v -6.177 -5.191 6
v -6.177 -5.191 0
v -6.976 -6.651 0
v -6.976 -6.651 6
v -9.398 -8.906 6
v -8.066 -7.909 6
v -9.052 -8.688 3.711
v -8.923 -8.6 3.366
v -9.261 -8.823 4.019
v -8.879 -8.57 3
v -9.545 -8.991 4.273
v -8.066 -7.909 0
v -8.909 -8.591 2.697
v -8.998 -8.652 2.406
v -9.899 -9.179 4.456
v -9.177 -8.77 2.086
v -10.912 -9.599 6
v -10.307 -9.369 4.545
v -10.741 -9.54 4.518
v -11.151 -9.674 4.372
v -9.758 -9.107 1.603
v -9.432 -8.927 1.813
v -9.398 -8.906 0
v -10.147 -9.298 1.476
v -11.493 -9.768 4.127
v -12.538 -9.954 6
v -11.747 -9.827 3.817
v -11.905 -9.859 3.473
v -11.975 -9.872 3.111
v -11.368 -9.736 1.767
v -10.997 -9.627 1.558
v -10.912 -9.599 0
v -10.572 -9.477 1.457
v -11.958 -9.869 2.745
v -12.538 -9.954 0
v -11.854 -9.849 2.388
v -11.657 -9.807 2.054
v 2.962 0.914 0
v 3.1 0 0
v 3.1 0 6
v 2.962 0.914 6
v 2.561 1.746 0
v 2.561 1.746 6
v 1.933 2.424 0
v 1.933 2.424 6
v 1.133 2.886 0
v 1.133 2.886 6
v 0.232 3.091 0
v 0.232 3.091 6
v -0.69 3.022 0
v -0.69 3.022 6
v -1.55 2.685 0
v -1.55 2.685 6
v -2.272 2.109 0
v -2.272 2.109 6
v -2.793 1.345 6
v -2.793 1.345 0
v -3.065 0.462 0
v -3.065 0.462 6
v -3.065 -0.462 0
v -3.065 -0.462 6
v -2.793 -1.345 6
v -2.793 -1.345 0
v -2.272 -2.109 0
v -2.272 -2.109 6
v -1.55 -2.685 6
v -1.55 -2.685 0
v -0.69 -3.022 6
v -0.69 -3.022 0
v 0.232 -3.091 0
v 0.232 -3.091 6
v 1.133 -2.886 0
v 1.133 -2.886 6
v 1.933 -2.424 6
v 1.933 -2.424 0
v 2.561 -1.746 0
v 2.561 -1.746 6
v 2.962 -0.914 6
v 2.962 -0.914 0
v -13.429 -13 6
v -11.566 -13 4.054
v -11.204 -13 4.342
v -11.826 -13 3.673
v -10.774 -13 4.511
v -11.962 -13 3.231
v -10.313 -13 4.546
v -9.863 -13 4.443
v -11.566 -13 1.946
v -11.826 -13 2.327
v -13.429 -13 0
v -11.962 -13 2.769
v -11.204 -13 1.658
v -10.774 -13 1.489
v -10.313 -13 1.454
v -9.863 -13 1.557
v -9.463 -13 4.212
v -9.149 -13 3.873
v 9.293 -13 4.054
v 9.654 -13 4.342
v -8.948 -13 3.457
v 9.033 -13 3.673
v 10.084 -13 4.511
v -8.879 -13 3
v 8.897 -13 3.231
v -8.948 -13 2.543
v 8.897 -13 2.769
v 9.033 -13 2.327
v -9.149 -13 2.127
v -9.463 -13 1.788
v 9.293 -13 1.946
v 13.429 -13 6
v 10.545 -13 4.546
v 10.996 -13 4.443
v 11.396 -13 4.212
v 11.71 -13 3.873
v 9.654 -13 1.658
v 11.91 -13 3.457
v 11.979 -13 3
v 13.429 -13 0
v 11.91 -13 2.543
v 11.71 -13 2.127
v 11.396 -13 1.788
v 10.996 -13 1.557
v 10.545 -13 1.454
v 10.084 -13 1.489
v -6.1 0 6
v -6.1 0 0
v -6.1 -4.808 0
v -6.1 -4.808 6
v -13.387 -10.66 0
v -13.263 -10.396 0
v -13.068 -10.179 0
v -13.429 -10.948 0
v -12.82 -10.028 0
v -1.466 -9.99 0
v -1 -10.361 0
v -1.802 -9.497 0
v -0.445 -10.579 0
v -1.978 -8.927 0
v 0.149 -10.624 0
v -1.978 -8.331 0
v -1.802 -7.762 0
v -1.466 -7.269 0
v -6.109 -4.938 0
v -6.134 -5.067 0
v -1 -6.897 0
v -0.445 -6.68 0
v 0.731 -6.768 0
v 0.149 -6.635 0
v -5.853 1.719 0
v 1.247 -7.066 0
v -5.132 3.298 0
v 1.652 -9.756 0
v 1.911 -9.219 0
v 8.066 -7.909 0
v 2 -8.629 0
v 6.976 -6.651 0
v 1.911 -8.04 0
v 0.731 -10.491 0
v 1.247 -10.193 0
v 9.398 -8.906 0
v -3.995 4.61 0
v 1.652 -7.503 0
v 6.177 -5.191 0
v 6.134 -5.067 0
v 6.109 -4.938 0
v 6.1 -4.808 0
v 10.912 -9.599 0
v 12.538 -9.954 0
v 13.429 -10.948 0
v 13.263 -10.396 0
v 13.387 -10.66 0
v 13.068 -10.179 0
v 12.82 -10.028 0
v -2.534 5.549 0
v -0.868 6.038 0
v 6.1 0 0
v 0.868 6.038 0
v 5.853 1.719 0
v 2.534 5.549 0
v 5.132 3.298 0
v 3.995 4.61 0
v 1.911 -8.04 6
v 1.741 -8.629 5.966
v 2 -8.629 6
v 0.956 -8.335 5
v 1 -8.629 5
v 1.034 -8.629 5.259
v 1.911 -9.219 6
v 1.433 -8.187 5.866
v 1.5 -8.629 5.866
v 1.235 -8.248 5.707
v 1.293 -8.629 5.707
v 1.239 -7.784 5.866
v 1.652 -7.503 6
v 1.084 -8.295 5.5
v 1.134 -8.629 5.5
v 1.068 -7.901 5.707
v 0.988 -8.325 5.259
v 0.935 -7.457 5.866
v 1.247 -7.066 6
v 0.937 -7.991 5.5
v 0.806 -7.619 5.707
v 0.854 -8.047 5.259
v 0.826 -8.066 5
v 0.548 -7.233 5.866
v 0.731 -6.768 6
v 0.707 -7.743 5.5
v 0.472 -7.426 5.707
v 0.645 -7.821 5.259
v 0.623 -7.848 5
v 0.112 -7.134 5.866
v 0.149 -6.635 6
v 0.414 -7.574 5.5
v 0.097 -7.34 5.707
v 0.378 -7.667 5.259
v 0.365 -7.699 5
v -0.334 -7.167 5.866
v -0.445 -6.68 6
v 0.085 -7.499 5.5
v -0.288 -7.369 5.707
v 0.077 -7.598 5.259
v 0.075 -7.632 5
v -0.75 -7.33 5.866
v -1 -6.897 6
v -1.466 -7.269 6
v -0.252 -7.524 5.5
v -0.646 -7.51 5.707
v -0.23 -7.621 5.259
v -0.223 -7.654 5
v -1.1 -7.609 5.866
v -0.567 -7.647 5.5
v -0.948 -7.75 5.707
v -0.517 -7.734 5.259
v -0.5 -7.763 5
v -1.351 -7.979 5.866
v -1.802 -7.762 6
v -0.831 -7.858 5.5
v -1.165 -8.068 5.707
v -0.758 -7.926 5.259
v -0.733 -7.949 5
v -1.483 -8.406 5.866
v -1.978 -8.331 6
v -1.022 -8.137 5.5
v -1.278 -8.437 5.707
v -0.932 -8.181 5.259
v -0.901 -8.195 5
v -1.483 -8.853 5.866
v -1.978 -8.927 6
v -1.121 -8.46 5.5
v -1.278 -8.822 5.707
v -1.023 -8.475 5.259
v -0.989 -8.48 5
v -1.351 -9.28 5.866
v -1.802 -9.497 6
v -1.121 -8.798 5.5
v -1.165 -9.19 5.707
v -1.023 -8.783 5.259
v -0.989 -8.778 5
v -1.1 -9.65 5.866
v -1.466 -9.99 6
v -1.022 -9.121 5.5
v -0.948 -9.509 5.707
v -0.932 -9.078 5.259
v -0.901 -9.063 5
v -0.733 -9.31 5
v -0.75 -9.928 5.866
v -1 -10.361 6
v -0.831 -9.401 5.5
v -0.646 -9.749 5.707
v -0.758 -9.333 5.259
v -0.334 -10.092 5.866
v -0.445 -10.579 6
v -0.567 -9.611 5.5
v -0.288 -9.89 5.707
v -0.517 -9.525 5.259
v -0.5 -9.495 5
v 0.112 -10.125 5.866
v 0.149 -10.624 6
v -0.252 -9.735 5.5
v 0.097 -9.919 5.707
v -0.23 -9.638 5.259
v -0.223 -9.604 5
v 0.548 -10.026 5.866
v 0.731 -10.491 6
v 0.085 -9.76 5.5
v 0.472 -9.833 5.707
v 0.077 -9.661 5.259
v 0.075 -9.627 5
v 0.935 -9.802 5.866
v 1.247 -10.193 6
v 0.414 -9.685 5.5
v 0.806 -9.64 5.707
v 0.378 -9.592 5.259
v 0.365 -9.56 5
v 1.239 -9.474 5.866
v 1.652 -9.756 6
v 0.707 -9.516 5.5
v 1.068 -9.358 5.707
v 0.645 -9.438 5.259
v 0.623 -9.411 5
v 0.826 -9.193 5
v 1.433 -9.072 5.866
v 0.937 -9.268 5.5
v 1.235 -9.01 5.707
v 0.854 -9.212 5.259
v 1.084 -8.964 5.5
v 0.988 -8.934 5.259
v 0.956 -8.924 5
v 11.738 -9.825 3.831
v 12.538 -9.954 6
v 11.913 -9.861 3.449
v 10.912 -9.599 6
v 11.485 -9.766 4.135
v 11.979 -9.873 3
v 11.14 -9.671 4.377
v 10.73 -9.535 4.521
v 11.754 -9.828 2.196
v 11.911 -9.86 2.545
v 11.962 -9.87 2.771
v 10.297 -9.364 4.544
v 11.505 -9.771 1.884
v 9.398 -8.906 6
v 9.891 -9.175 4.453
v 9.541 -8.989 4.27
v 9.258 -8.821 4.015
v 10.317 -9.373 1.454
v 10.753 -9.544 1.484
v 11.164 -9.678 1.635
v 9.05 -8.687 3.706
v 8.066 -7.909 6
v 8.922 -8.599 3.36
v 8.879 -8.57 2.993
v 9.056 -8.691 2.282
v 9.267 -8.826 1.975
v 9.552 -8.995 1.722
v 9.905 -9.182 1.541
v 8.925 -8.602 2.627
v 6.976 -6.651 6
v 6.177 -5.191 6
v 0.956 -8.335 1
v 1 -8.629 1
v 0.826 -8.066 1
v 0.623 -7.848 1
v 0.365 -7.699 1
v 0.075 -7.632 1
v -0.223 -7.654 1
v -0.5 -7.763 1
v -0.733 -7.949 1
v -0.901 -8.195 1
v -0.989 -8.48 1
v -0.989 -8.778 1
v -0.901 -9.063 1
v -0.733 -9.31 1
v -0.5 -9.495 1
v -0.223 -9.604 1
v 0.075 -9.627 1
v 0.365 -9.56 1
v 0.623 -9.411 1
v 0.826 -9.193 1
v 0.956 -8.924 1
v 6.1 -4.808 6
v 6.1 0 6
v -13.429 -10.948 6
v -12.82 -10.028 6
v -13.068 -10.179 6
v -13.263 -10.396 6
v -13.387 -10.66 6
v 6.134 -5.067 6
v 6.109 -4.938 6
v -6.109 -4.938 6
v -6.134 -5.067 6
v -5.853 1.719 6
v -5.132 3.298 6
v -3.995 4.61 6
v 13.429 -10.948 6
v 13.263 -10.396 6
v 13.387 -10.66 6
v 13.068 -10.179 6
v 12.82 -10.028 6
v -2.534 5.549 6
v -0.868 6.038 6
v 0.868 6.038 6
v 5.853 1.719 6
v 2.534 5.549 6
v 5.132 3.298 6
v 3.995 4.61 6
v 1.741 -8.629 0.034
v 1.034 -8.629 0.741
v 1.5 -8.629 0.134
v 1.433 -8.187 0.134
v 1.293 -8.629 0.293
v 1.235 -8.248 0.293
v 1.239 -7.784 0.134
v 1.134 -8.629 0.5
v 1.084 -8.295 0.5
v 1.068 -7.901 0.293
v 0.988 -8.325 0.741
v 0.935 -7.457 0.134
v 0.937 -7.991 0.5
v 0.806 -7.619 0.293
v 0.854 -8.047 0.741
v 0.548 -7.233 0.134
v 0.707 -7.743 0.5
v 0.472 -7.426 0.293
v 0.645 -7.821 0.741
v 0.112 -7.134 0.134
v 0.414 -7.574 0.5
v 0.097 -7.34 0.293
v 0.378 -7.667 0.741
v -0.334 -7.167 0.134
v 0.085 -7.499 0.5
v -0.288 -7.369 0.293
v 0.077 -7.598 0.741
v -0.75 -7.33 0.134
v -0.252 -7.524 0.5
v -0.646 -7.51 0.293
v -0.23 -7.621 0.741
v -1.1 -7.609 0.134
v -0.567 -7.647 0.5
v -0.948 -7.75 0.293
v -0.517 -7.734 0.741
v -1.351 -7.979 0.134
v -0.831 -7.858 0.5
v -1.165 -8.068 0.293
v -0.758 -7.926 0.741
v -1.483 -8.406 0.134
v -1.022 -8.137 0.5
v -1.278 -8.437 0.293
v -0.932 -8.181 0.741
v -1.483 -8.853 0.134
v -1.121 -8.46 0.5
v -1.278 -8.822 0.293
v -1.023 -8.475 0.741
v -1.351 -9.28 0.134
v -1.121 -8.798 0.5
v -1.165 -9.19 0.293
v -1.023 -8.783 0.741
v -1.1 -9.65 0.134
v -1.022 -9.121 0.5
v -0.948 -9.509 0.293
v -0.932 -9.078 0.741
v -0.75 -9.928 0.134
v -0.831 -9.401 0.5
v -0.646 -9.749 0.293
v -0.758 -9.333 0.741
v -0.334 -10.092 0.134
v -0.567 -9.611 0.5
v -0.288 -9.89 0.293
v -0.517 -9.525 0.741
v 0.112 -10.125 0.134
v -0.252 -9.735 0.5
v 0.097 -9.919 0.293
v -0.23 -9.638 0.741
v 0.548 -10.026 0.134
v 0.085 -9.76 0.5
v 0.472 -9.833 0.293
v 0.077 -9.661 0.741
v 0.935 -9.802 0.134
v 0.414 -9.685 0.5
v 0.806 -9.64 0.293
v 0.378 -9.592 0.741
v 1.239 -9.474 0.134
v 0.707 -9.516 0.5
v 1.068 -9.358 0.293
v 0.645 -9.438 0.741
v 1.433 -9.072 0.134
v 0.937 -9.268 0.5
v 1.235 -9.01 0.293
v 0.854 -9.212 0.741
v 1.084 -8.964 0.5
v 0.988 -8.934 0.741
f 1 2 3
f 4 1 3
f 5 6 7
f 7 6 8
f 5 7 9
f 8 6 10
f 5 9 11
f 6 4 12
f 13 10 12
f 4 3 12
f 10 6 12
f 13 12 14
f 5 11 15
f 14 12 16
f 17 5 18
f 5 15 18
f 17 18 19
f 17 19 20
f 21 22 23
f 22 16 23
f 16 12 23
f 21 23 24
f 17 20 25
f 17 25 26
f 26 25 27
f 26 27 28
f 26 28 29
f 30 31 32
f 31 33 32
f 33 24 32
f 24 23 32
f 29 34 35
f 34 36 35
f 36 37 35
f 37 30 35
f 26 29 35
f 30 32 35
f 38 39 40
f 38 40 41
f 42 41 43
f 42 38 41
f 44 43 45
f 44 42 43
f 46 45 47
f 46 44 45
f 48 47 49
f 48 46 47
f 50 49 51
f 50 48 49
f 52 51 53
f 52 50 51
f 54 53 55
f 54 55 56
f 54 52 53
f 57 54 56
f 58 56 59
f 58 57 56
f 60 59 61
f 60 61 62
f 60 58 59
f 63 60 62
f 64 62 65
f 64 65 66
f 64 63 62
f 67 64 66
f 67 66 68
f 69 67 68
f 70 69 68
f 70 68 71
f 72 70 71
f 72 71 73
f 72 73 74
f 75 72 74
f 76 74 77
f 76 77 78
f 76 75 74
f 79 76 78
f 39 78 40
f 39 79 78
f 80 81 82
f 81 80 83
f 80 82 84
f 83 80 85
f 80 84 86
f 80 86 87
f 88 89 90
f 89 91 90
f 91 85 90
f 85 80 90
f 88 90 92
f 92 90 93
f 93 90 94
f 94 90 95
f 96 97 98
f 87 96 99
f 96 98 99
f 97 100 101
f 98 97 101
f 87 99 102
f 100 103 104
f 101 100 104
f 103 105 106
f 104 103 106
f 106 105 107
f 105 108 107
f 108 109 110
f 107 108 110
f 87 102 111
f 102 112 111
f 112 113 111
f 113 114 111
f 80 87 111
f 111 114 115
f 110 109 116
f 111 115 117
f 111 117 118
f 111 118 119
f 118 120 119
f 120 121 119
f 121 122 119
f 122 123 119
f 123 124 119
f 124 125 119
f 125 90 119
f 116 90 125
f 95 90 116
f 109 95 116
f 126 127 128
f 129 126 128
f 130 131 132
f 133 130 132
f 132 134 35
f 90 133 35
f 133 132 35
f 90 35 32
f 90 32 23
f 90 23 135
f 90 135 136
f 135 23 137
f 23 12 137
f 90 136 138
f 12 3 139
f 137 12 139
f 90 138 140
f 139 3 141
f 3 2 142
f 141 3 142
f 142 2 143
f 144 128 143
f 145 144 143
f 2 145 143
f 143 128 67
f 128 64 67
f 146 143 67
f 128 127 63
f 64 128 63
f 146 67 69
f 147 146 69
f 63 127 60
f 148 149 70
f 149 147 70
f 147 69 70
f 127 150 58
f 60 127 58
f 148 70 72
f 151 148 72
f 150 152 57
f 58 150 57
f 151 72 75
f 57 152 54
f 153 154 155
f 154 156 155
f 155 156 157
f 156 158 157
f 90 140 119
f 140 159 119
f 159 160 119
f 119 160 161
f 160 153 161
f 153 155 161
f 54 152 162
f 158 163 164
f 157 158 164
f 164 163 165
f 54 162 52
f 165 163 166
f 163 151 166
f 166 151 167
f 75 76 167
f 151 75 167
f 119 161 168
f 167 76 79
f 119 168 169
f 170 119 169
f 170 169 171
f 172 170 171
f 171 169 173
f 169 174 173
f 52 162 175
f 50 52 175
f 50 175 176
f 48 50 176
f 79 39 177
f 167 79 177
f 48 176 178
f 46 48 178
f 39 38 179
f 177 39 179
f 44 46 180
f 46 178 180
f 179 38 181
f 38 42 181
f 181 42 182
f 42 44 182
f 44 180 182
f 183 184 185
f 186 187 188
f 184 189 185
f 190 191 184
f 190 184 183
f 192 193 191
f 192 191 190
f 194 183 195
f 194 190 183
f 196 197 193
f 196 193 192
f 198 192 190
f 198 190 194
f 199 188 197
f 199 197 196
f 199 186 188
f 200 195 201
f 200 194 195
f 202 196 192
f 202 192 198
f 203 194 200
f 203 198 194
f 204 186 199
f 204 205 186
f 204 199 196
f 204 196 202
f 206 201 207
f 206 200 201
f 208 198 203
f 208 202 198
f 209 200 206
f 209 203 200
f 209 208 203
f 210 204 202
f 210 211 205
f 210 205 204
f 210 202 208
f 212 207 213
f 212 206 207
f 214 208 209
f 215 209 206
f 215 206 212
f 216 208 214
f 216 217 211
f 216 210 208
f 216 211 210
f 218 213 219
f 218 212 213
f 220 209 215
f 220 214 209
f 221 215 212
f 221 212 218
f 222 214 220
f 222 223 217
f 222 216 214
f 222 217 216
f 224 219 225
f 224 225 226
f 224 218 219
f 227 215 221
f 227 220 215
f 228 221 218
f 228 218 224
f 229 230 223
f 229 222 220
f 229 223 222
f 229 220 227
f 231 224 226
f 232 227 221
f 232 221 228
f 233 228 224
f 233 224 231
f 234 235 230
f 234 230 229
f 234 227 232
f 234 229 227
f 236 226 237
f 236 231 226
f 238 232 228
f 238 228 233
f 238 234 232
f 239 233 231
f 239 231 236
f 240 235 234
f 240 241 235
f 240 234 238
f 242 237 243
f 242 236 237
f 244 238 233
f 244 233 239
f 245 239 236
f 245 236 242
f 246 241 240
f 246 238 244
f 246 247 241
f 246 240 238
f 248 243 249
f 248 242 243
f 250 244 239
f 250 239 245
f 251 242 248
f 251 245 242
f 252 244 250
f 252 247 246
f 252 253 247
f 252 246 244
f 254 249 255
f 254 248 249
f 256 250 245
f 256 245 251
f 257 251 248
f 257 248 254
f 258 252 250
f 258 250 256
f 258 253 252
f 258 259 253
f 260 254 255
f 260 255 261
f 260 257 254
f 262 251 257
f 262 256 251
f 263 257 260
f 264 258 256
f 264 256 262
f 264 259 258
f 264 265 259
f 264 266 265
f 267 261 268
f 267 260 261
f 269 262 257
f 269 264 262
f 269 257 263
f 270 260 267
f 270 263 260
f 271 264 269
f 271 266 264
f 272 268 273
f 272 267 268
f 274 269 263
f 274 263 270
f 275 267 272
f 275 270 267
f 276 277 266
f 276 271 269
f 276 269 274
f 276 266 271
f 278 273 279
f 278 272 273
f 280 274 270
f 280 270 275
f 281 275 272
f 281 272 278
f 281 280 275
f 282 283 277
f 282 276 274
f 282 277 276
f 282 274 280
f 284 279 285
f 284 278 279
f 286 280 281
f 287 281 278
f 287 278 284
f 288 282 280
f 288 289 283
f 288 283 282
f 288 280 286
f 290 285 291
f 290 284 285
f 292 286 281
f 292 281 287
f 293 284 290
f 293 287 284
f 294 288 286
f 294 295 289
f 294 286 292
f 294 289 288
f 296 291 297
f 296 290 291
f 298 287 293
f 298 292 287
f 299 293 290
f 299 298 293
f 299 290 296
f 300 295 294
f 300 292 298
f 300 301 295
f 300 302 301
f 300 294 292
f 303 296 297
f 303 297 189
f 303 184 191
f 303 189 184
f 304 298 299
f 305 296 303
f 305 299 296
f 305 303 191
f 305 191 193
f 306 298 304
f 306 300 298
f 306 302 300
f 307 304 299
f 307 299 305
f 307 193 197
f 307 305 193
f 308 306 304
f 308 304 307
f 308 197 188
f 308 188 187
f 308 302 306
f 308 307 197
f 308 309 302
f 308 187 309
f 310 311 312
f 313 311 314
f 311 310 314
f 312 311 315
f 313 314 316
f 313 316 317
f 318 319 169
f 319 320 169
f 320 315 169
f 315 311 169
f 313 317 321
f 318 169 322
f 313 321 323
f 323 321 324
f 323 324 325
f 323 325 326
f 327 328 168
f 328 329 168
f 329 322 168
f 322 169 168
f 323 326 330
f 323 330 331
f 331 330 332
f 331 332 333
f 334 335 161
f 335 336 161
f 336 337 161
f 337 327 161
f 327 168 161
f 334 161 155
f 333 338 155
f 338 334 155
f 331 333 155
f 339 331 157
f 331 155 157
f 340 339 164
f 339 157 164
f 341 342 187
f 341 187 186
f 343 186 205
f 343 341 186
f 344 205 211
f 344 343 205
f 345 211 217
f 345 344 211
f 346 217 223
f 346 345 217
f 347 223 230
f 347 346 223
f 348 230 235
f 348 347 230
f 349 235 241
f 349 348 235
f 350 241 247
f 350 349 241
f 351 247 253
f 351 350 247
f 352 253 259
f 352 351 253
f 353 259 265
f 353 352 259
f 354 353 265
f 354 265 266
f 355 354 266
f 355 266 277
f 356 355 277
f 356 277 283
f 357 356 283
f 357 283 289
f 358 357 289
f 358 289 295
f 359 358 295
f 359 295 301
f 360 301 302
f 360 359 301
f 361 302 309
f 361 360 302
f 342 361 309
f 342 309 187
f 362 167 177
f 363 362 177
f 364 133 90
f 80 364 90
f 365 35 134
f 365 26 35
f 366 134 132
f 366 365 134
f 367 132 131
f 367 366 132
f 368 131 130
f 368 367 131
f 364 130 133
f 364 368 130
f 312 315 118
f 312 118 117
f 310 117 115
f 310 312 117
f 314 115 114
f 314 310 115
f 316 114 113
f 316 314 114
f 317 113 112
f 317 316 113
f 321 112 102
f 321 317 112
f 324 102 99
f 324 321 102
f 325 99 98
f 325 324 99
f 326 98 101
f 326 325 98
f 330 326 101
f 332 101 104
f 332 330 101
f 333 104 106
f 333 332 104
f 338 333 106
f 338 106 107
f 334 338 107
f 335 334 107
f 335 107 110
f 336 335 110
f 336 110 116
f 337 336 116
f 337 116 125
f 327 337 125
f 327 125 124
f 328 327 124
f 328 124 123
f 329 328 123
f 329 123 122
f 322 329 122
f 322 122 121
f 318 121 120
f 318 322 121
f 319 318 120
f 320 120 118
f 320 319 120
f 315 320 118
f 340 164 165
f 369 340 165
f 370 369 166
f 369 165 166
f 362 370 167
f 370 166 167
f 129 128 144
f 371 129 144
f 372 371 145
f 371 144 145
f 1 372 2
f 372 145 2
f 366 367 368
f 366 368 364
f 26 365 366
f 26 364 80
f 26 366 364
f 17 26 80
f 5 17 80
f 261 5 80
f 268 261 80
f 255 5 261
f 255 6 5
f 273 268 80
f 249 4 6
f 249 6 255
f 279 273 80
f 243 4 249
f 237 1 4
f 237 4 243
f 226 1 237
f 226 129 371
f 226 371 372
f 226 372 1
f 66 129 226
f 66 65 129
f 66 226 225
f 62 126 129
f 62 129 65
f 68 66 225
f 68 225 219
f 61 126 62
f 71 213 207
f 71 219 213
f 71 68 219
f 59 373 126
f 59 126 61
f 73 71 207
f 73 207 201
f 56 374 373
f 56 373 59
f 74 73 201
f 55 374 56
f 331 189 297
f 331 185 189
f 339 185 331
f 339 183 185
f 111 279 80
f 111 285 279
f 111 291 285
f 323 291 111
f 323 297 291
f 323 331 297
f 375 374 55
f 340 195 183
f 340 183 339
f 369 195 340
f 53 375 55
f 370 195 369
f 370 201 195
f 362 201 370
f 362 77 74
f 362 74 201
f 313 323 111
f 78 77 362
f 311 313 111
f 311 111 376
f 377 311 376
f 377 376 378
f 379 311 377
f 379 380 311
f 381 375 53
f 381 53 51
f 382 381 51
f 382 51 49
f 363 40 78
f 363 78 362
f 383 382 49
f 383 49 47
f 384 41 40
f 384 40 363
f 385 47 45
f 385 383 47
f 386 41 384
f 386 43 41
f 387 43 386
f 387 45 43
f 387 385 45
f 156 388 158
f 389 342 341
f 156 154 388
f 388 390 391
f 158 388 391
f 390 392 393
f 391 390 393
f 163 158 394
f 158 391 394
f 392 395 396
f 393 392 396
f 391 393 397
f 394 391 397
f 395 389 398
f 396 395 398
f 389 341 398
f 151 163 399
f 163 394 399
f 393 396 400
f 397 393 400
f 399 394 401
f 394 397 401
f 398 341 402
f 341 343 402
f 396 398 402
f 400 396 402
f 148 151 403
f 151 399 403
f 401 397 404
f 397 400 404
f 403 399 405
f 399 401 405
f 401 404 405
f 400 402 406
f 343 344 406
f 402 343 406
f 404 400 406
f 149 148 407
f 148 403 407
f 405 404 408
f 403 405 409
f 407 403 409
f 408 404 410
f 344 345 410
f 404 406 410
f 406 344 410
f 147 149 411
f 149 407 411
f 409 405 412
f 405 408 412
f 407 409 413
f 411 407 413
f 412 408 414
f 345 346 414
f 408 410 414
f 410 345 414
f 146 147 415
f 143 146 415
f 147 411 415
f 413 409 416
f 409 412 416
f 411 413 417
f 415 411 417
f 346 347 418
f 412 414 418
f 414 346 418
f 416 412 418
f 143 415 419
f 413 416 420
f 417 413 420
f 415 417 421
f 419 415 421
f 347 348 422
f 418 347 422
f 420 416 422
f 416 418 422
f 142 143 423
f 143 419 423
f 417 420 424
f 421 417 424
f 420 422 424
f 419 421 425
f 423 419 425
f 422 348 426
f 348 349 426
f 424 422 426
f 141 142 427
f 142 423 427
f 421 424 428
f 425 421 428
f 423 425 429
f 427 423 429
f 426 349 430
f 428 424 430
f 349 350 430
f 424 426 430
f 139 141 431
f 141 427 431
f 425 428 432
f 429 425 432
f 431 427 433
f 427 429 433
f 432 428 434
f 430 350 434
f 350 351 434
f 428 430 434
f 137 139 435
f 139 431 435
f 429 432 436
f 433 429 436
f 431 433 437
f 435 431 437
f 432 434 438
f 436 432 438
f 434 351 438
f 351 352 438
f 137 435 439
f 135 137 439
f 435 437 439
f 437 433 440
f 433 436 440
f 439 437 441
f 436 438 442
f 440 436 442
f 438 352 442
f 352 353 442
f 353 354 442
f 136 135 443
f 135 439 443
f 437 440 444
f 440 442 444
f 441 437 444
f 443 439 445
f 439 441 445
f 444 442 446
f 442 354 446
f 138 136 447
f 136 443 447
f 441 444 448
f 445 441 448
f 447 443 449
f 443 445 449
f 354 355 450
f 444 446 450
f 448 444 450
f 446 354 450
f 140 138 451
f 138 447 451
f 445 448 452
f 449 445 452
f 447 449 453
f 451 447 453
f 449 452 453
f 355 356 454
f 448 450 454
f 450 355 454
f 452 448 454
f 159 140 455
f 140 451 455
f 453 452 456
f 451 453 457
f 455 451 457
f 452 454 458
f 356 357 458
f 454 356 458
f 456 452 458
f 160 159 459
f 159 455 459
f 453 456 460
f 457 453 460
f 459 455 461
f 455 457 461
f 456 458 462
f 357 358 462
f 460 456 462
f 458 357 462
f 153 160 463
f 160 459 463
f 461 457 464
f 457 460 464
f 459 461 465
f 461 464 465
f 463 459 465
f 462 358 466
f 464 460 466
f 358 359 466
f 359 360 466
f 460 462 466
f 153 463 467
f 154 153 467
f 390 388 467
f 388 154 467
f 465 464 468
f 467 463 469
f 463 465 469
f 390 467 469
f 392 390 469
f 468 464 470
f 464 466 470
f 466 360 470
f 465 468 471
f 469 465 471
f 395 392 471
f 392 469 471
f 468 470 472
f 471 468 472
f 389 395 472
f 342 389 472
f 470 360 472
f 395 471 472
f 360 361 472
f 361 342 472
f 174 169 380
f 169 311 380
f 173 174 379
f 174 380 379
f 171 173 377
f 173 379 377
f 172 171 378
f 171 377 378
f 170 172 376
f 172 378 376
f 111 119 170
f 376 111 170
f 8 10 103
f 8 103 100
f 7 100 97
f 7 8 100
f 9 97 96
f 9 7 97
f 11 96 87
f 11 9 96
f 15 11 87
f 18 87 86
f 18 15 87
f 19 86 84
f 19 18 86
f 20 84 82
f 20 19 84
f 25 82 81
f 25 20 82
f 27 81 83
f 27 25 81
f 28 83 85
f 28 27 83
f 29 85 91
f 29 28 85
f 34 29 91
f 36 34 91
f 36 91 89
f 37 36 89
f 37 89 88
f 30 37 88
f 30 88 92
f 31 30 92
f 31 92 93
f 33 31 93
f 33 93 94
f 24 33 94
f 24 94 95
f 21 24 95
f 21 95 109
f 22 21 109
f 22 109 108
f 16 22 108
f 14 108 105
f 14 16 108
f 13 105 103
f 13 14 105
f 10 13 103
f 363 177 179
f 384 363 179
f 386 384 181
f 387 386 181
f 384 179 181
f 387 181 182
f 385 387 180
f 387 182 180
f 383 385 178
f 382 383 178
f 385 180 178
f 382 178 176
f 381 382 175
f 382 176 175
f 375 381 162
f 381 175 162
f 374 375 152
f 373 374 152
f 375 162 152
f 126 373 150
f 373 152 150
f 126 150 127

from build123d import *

# Parameters (mm, degrees)
SKETCH1_R               = 3.1
SKETCH1_R_2             = 1
BOSS_EXTRUDE1_DEPTH     = 6
CUT_EXTRUDE1_DEPTH      = 25.107196906
CUT_EXTRUDE1_DEPTH_BACK = 25.107196906
SKETCH2_R               = 1.55
FILLET1_R               = 1


with BuildPart() as part:
    # Sketch1 → Boss-Extrude1 (new body)
    with BuildSketch(Plane.XY):
        with BuildLine():
            Line((-6.1, 0), (-6.1, -4.807578818))
            ThreePointArc((-6.1, -4.807578818), (-6.119327431, -5.003234924), (-6.176562624, -5.191327971))
            ThreePointArc((-6.176562624, -5.191327971), (-9.070412736, -8.700522421), (-13.42933143, -10))
            Line((-13.42933143, -10), (-13.42933143, -13))
            Line((-13.42933143, -13), (13.42933143, -13))
            Line((13.42933143, -13), (13.42933143, -10))
            ThreePointArc((13.42933143, -10), (9.070412736, -8.700522421), (6.176562624, -5.191327971))
            ThreePointArc((6.176562624, -5.191327971), (6.119327431, -5.003234924), (6.1, -4.807578818))
            Line((6.1, -4.807578818), (6.1, 0))
            ThreePointArc((6.1, 0), (0, 6.1), (-6.1, 0))
        make_face()
        Circle(SKETCH1_R, mode=Mode.SUBTRACT)
        with Locations((0, -8.629378488)):
            Circle(SKETCH1_R_2, mode=Mode.SUBTRACT)
    extrude(amount=BOSS_EXTRUDE1_DEPTH)

    # Sketch2 → Cut-Extrude1 (cut, two sides: drawn at the far end of the back side and taken through both)
    with BuildSketch(Plane.XZ.offset(13).offset(-CUT_EXTRUDE1_DEPTH_BACK)):
        with Locations((-10.42933143, 3)):
            Circle(SKETCH2_R)
        with Locations((10.42933143, 3)):
            Circle(SKETCH2_R)
    extrude(amount=CUT_EXTRUDE1_DEPTH + CUT_EXTRUDE1_DEPTH_BACK, mode=Mode.SUBTRACT)

    # Fillet1
    fillet1_edges = [part.edges().sort_by_distance(p)[0] for p in [
        (-1, -8.629378488, 0),
        (13.42933143, -10, 3),
        (-13.42933143, -10, 3),
        (-1, -8.629378488, 6),
    ]]
    fillet(fillet1_edges, radius=FILLET1_R)


solid = part.part
